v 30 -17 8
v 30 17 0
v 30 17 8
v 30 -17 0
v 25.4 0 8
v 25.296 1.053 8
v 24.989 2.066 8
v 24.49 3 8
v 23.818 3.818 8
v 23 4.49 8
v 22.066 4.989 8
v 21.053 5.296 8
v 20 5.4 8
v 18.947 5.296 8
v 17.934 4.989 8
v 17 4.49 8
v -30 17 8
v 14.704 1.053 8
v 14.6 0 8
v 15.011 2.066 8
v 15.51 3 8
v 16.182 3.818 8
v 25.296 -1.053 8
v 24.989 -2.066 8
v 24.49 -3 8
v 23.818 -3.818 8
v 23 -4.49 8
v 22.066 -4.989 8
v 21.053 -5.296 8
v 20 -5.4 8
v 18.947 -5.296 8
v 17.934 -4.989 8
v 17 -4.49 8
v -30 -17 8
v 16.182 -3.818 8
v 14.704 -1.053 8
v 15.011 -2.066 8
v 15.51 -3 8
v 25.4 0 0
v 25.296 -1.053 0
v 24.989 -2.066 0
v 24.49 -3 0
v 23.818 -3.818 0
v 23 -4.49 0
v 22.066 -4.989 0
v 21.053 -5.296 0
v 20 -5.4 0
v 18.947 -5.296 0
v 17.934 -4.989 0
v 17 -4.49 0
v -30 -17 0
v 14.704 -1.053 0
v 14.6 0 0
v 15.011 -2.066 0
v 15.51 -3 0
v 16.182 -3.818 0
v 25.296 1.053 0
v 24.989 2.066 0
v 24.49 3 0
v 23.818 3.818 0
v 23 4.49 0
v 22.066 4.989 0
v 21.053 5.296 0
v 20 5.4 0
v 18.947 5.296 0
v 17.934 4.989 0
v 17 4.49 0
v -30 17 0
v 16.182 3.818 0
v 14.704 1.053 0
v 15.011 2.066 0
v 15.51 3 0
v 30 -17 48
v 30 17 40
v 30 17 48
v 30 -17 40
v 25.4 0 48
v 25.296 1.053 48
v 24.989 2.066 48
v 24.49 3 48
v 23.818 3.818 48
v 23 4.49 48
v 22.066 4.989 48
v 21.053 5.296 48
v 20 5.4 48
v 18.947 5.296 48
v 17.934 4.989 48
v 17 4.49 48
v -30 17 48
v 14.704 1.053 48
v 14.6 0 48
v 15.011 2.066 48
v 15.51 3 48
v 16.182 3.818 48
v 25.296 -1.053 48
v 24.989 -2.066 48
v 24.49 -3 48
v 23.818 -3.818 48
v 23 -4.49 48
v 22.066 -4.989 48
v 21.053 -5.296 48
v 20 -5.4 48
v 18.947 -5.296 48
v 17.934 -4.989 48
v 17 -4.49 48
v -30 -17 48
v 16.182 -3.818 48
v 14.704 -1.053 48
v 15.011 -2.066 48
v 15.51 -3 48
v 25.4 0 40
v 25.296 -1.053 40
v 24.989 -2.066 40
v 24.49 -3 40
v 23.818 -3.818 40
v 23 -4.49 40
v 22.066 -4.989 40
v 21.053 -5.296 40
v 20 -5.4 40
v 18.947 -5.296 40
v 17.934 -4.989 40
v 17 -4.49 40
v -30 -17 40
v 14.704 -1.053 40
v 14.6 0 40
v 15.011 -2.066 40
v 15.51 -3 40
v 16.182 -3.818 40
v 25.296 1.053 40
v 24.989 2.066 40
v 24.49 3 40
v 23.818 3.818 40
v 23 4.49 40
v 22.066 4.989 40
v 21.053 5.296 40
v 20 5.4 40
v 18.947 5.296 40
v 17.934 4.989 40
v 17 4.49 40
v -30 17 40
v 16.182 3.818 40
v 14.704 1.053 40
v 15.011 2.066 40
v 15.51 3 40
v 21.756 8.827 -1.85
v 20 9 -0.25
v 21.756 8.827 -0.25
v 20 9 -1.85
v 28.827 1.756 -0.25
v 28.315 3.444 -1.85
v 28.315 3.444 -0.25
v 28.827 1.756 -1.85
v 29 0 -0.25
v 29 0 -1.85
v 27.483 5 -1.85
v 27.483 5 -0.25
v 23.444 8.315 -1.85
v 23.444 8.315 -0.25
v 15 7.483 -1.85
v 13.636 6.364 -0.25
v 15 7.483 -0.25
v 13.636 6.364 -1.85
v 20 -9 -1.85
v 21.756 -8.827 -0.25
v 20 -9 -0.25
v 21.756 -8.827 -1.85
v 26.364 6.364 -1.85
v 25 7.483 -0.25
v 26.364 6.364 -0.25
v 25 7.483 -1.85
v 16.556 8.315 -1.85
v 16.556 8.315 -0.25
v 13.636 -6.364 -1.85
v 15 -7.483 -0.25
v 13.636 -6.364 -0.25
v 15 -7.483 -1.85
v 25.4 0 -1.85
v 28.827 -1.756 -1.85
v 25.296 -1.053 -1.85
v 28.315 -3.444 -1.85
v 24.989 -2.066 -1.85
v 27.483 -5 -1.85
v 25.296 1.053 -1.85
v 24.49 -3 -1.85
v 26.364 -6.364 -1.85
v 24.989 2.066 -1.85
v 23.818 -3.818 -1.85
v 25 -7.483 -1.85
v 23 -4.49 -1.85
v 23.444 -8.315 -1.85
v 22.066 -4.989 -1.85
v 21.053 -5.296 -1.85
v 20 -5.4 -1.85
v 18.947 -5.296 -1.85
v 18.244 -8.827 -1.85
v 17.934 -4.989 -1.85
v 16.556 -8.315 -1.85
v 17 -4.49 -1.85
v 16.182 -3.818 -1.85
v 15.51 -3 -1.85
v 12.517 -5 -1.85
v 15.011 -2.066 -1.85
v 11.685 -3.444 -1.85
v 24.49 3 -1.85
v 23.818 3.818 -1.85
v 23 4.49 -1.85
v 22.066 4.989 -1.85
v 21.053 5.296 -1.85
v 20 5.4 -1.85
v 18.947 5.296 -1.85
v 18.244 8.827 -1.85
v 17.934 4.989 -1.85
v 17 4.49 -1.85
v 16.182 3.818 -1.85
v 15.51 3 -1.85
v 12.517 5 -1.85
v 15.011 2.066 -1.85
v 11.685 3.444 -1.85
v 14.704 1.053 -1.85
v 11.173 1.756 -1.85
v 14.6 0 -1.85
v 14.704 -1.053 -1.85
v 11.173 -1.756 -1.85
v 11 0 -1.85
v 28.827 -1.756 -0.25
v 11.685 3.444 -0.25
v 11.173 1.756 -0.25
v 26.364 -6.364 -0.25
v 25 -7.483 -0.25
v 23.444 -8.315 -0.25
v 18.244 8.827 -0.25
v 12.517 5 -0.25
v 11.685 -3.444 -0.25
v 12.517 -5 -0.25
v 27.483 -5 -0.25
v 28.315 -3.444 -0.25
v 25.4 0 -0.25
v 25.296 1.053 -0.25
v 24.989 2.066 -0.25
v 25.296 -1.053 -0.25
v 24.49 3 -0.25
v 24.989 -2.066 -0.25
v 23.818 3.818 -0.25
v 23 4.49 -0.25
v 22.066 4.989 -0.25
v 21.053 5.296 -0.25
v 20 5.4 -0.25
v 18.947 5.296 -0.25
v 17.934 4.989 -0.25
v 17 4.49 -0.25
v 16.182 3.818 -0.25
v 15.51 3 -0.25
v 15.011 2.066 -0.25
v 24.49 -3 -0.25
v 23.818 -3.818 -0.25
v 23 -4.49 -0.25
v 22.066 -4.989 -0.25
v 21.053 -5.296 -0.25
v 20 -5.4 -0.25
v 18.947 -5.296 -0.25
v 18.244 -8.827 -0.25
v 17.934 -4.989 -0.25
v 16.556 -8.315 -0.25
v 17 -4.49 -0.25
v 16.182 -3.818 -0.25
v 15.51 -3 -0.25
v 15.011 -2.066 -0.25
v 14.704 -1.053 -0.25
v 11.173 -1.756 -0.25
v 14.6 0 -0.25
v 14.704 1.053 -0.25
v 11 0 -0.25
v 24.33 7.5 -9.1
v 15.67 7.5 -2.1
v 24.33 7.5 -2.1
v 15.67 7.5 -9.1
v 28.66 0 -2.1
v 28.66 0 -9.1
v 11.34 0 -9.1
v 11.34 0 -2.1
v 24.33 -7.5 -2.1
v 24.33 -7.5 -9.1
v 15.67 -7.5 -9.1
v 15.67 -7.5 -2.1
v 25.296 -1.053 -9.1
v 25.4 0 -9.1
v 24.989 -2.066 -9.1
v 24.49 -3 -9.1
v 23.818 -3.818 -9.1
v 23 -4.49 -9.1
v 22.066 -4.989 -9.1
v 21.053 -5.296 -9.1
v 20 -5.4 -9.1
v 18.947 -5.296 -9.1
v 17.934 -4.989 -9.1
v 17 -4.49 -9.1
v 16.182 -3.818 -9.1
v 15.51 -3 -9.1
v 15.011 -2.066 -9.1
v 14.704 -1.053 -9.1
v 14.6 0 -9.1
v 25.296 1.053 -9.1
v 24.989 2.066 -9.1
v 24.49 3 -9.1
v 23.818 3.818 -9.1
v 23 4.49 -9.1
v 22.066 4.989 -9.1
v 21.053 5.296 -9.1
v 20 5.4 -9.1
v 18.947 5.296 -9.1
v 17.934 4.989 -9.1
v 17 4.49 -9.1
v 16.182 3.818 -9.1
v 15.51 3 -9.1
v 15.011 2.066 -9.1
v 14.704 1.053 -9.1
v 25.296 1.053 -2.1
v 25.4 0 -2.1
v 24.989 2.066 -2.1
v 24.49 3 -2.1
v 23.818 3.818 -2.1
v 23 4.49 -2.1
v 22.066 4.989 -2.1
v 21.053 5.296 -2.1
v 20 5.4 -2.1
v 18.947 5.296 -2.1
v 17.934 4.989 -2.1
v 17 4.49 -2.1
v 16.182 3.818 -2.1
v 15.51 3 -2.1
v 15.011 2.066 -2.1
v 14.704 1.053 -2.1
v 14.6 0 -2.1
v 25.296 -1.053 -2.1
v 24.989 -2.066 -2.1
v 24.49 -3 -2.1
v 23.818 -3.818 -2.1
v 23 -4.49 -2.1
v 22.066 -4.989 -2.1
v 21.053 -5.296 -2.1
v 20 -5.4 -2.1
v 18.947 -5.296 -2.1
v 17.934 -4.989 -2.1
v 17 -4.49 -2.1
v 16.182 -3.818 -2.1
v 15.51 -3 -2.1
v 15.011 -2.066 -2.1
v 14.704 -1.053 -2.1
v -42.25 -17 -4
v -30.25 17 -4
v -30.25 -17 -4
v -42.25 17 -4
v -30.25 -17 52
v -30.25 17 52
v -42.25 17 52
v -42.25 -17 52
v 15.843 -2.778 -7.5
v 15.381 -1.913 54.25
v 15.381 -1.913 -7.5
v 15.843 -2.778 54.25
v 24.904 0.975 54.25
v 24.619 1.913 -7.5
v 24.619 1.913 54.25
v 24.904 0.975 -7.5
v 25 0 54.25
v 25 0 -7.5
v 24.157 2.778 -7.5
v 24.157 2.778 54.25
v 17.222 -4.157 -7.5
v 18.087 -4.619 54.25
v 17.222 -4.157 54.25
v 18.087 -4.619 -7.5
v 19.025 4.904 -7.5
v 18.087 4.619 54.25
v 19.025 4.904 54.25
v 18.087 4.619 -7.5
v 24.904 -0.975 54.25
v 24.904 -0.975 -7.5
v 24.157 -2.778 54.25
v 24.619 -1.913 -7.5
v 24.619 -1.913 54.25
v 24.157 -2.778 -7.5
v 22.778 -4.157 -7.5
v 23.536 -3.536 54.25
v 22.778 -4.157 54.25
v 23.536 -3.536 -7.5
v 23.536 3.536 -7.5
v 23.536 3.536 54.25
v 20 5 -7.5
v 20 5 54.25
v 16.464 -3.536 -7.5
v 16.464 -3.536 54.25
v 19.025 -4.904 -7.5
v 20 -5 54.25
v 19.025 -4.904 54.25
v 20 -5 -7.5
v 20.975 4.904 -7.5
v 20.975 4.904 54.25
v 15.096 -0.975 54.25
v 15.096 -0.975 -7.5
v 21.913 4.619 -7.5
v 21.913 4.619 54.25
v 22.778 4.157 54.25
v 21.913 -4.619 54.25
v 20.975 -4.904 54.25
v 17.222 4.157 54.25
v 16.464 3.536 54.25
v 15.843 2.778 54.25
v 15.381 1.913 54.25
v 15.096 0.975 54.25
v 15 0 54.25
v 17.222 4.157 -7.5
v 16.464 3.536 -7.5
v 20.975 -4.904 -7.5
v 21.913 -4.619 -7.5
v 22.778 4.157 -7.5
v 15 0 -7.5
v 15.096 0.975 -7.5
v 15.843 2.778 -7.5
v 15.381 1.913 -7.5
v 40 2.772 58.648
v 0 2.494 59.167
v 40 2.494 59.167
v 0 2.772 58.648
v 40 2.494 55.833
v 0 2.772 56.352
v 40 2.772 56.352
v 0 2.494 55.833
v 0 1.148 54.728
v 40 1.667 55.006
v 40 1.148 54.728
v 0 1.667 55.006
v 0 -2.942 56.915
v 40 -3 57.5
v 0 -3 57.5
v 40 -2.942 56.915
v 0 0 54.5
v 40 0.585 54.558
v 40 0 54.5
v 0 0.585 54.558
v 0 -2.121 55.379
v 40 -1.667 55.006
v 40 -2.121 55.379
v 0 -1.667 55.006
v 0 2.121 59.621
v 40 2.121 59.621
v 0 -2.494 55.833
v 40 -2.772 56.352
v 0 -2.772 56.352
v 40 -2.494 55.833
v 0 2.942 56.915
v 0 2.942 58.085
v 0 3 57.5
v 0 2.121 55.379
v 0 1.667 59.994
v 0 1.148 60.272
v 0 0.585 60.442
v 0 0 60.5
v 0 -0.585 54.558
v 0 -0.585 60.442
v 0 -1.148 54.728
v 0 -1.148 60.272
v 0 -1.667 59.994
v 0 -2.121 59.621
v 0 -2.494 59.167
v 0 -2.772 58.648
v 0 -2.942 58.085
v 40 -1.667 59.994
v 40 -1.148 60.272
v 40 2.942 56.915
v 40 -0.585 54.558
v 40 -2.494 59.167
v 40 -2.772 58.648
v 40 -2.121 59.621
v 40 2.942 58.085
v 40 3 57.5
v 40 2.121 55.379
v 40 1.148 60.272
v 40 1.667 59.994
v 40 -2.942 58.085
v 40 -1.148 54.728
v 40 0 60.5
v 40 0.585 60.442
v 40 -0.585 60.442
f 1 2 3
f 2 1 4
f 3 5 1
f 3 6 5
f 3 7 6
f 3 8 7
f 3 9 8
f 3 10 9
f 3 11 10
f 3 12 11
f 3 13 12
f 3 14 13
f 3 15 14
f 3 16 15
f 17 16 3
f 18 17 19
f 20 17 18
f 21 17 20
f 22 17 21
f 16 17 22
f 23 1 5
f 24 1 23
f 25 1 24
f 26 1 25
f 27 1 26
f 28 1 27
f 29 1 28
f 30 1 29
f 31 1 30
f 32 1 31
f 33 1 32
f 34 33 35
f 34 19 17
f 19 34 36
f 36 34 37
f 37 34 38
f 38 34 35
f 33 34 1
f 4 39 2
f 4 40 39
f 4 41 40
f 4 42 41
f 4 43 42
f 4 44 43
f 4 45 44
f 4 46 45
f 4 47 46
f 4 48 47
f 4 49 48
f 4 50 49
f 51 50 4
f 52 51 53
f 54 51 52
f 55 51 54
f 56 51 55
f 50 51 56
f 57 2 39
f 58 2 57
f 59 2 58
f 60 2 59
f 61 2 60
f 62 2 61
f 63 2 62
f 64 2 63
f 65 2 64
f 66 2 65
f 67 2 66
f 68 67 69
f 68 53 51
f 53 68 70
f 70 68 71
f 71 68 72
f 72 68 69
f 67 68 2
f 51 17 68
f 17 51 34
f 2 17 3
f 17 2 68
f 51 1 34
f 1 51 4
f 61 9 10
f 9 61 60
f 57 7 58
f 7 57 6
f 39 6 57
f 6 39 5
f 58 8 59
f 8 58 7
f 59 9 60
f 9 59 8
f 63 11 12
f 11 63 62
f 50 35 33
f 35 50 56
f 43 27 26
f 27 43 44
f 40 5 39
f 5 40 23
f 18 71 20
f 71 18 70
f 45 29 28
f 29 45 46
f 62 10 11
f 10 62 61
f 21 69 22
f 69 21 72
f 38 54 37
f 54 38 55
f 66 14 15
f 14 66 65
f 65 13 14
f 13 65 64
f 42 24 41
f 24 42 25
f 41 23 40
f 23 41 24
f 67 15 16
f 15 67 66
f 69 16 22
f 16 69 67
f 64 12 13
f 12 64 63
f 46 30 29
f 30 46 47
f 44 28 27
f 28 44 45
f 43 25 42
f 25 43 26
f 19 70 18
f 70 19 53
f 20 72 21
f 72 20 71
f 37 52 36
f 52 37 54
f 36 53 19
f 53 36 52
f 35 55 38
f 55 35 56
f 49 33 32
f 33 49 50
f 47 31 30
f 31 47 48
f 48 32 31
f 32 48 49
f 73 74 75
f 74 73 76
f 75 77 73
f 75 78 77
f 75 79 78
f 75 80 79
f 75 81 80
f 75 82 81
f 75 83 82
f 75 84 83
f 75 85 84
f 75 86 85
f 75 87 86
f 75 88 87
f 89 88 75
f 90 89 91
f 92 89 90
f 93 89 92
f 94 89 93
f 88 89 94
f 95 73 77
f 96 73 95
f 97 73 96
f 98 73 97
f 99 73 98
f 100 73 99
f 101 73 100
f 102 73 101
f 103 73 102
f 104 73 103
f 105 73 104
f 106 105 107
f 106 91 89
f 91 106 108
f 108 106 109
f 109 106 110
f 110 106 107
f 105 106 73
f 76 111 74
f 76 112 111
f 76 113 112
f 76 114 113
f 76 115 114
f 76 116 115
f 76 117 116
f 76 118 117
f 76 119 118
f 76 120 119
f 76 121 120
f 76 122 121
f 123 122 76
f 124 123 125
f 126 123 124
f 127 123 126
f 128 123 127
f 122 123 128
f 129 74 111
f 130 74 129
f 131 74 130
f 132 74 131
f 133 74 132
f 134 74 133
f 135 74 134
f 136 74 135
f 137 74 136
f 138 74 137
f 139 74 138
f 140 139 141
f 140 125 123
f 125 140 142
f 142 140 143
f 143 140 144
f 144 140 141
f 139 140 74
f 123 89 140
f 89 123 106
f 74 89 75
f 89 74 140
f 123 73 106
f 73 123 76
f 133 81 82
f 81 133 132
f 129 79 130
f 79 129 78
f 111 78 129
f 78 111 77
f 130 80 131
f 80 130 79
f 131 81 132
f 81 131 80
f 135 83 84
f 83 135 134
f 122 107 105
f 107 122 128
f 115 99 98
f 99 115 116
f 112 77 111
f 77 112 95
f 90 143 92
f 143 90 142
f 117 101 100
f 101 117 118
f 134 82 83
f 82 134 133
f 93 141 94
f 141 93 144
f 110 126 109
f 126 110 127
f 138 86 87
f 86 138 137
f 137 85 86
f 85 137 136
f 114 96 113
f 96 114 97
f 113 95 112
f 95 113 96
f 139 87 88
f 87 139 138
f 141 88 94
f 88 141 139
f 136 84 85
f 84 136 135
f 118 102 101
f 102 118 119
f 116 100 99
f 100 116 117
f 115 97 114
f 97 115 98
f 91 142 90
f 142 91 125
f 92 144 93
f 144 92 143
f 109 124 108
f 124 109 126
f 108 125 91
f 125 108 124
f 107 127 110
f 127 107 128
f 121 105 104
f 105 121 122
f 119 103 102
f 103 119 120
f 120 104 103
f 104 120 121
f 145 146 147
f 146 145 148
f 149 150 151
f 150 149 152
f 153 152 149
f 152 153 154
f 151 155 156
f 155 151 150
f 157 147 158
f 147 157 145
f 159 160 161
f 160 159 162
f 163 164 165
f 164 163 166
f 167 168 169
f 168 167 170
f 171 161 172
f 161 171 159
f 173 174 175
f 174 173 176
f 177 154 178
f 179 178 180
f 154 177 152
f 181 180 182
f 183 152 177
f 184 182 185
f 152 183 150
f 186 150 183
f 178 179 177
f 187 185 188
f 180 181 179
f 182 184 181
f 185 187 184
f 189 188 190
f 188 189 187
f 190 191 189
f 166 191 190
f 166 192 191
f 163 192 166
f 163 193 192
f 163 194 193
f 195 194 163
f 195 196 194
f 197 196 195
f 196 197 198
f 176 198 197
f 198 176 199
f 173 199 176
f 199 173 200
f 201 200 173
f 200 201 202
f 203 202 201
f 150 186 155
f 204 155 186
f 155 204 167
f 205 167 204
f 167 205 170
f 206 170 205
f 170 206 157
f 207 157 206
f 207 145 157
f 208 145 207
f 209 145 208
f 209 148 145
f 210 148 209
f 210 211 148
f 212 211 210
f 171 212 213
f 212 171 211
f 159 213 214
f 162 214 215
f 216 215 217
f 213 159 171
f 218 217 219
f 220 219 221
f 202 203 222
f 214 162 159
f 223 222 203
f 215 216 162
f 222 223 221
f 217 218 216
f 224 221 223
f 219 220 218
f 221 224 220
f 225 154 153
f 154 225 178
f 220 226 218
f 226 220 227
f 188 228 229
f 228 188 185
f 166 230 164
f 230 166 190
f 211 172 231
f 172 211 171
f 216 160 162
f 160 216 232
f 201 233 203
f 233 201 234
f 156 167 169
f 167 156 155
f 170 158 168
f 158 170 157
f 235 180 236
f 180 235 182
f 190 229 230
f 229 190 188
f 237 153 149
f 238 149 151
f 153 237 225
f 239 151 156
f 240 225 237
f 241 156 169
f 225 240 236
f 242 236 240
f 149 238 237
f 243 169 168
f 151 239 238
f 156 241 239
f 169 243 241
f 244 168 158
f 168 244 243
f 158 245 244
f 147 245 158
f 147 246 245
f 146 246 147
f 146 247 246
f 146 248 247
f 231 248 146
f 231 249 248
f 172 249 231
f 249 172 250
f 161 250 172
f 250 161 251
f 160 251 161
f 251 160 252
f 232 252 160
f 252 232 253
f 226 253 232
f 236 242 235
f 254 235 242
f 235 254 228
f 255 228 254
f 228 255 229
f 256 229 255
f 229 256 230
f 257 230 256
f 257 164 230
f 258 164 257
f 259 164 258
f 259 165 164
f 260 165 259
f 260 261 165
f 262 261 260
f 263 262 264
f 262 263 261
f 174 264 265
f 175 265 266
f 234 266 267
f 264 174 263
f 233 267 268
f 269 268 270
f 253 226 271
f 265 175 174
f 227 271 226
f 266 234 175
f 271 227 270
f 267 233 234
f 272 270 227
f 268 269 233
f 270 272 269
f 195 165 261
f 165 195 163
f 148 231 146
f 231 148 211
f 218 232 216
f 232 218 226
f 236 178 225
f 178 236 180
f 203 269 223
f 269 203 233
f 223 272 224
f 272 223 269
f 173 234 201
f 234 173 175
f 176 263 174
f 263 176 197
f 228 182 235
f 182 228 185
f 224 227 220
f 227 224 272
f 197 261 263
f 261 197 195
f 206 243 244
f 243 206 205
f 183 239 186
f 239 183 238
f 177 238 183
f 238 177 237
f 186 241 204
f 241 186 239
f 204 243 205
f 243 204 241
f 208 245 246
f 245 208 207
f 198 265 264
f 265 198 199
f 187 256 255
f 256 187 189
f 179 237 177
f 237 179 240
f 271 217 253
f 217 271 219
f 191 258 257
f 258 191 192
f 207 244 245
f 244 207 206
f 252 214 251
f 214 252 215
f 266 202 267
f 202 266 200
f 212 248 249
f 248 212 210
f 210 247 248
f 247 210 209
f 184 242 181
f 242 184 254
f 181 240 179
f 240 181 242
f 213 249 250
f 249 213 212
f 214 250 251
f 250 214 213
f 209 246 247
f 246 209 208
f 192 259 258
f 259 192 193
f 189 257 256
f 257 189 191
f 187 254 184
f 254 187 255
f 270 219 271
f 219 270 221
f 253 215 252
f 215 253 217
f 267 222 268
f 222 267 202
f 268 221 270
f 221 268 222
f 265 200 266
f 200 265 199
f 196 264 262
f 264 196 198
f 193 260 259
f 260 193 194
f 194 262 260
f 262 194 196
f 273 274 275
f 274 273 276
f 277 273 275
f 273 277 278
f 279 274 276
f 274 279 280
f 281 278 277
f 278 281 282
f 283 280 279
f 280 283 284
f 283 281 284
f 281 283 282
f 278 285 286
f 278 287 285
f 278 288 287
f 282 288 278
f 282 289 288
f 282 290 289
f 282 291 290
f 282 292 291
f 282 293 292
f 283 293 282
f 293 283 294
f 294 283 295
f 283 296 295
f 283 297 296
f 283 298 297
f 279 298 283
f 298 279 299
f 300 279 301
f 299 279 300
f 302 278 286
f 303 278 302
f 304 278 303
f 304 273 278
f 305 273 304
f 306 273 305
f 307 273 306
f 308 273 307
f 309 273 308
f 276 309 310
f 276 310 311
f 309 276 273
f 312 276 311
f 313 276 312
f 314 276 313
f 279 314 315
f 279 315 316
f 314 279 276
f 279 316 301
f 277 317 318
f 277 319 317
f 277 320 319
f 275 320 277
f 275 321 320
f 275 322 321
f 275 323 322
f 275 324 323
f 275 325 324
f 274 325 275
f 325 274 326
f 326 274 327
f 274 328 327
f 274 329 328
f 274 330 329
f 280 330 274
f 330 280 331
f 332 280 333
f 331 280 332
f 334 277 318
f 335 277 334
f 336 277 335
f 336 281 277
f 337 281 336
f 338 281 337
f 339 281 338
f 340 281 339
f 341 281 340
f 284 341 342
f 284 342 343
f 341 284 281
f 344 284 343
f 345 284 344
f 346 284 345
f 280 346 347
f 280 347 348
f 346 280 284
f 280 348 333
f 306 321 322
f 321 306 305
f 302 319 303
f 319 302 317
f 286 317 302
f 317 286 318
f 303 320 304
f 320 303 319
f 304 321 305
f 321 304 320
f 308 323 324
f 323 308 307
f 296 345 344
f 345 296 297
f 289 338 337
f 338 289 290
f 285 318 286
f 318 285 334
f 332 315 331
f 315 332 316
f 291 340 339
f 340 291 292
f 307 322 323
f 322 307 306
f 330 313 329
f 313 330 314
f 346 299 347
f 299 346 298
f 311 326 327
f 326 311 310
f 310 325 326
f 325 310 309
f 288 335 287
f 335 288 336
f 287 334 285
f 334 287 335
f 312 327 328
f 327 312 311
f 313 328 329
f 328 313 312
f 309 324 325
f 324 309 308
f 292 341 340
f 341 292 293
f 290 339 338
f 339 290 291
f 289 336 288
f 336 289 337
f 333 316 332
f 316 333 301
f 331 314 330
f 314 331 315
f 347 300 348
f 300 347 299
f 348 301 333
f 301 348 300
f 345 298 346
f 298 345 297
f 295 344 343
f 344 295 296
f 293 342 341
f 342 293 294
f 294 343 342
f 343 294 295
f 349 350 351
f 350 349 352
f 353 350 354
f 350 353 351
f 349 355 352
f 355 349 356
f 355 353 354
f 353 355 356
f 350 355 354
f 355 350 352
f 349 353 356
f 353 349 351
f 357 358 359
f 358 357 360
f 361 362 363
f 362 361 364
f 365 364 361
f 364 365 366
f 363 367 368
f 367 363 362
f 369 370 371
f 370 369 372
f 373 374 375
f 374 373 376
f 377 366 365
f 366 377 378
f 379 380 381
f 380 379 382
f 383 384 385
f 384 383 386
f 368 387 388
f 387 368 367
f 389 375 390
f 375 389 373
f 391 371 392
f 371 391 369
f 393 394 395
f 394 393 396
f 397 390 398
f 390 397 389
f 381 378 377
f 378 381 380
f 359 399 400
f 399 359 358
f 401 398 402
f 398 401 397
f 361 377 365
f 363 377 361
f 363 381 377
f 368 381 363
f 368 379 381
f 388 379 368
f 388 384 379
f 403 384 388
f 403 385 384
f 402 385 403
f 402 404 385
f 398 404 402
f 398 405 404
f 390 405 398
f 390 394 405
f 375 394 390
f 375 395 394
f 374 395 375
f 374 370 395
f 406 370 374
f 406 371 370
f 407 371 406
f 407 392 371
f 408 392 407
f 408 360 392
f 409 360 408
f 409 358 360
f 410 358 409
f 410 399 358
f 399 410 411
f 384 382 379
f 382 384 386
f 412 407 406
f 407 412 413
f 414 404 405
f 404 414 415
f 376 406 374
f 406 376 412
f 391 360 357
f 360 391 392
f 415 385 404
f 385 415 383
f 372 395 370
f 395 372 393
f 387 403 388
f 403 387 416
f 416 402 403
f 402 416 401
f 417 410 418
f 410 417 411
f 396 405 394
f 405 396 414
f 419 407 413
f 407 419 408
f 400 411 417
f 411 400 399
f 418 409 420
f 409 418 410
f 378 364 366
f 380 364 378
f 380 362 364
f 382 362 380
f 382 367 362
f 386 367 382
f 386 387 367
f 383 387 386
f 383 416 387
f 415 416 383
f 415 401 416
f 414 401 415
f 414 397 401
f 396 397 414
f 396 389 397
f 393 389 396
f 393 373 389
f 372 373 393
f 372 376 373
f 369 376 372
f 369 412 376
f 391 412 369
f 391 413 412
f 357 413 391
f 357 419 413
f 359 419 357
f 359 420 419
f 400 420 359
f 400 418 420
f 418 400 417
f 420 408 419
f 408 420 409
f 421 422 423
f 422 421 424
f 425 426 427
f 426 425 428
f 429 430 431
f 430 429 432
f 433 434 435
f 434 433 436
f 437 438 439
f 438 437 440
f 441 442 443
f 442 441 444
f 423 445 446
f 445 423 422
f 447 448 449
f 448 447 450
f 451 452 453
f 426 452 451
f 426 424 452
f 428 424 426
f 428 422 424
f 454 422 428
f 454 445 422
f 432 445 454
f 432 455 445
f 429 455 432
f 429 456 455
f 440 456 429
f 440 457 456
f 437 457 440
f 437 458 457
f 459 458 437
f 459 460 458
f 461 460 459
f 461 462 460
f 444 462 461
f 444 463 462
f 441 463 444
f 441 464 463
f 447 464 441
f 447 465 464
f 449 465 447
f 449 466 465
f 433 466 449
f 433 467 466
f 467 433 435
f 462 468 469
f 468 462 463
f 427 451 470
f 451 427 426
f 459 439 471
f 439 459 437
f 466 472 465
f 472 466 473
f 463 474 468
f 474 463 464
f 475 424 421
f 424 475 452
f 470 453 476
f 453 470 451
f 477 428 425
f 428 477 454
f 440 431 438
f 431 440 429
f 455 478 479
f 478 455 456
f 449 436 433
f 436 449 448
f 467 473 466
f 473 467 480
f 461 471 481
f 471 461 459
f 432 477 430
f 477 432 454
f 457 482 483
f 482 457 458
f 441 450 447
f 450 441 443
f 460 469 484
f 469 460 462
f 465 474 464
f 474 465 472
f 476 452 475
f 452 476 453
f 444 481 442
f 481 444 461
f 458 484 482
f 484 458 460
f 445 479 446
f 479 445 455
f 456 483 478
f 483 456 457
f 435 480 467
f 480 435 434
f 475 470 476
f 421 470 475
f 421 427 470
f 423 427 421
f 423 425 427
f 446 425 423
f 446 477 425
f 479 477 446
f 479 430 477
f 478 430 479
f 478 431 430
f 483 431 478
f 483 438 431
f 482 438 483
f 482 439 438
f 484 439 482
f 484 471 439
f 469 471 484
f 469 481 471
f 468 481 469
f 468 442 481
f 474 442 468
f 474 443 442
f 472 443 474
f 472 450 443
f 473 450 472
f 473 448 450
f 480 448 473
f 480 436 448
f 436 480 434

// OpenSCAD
$fn = 32;

// ------------------------------------------------------------------------
// C clamp: throat 40 mm, screw d10
// Every part is its own module, assembly() places every instance.
// ------------------------------------------------------------------------

// --- part 1 ---
module clamp_arm() {
  difference() {
    translate([-30, -17, 0]) cube([60, 34, 8]);
    translate([20, 0, -1]) cylinder(h = 10, d = 10.8);
  }
}

// --- part 2 ---
module clamp_spine() {
  difference() {
    translate([-28, -17, 0]) cube([56, 34, 12]);
  }
}

// --- part 3 ---
module clamp_screw() {
  translate([0, 0, -30.875]) cylinder(h = 61.75, d = 10);
}

// --- part 4 ---
module clamp_washer() {
  difference() {
      translate([0, 0, 0]) cylinder(h = 1.6, d = 18);
      translate([0, 0, -1]) cylinder(h = 3.6, d = 10.8);
    }
}

// --- part 5 ---
module clamp_nut() {
  difference() {
    linear_extrude(height = 7) polygon(points = [[8.66, 0], [4.33, 7.5], [-4.33, 7.5], [-8.66, 0], [-4.33, -7.5], [4.33, -7.5]]);
    translate([0, 0, -1]) cylinder(h = 9, d = 10.8);
  }
}

// --- part 6 ---
module tommy_bar() {
  translate([0, 0, -20]) cylinder(h = 40, d = 6);
}

// --- assembly ---
module assembly() {
  color([0.80, 0.24, 0.20]) translate([0, 0, 0]) rotate([0, 0, 0]) clamp_arm();
  color([0.20, 0.45, 0.75]) translate([0, 0, 40]) rotate([0, 0, 0]) clamp_arm();
  color([0.25, 0.62, 0.32]) translate([-42.25, 0, 24]) rotate([0, 90, 0]) clamp_spine();
  color([0.92, 0.70, 0.18]) translate([20, 0, 23.375]) rotate([0, 0, 0]) clamp_screw();
  color([0.58, 0.35, 0.70]) translate([20, 0, -1.85]) rotate([0, 0, 0]) clamp_washer();
  color([0.16, 0.66, 0.66]) translate([20, 0, -9.1]) rotate([0, 0, 0]) clamp_nut();
  color([0.85, 0.48, 0.18]) translate([20, 0, 57.5]) rotate([0, 90, 0]) tommy_bar();
}

assembly();
